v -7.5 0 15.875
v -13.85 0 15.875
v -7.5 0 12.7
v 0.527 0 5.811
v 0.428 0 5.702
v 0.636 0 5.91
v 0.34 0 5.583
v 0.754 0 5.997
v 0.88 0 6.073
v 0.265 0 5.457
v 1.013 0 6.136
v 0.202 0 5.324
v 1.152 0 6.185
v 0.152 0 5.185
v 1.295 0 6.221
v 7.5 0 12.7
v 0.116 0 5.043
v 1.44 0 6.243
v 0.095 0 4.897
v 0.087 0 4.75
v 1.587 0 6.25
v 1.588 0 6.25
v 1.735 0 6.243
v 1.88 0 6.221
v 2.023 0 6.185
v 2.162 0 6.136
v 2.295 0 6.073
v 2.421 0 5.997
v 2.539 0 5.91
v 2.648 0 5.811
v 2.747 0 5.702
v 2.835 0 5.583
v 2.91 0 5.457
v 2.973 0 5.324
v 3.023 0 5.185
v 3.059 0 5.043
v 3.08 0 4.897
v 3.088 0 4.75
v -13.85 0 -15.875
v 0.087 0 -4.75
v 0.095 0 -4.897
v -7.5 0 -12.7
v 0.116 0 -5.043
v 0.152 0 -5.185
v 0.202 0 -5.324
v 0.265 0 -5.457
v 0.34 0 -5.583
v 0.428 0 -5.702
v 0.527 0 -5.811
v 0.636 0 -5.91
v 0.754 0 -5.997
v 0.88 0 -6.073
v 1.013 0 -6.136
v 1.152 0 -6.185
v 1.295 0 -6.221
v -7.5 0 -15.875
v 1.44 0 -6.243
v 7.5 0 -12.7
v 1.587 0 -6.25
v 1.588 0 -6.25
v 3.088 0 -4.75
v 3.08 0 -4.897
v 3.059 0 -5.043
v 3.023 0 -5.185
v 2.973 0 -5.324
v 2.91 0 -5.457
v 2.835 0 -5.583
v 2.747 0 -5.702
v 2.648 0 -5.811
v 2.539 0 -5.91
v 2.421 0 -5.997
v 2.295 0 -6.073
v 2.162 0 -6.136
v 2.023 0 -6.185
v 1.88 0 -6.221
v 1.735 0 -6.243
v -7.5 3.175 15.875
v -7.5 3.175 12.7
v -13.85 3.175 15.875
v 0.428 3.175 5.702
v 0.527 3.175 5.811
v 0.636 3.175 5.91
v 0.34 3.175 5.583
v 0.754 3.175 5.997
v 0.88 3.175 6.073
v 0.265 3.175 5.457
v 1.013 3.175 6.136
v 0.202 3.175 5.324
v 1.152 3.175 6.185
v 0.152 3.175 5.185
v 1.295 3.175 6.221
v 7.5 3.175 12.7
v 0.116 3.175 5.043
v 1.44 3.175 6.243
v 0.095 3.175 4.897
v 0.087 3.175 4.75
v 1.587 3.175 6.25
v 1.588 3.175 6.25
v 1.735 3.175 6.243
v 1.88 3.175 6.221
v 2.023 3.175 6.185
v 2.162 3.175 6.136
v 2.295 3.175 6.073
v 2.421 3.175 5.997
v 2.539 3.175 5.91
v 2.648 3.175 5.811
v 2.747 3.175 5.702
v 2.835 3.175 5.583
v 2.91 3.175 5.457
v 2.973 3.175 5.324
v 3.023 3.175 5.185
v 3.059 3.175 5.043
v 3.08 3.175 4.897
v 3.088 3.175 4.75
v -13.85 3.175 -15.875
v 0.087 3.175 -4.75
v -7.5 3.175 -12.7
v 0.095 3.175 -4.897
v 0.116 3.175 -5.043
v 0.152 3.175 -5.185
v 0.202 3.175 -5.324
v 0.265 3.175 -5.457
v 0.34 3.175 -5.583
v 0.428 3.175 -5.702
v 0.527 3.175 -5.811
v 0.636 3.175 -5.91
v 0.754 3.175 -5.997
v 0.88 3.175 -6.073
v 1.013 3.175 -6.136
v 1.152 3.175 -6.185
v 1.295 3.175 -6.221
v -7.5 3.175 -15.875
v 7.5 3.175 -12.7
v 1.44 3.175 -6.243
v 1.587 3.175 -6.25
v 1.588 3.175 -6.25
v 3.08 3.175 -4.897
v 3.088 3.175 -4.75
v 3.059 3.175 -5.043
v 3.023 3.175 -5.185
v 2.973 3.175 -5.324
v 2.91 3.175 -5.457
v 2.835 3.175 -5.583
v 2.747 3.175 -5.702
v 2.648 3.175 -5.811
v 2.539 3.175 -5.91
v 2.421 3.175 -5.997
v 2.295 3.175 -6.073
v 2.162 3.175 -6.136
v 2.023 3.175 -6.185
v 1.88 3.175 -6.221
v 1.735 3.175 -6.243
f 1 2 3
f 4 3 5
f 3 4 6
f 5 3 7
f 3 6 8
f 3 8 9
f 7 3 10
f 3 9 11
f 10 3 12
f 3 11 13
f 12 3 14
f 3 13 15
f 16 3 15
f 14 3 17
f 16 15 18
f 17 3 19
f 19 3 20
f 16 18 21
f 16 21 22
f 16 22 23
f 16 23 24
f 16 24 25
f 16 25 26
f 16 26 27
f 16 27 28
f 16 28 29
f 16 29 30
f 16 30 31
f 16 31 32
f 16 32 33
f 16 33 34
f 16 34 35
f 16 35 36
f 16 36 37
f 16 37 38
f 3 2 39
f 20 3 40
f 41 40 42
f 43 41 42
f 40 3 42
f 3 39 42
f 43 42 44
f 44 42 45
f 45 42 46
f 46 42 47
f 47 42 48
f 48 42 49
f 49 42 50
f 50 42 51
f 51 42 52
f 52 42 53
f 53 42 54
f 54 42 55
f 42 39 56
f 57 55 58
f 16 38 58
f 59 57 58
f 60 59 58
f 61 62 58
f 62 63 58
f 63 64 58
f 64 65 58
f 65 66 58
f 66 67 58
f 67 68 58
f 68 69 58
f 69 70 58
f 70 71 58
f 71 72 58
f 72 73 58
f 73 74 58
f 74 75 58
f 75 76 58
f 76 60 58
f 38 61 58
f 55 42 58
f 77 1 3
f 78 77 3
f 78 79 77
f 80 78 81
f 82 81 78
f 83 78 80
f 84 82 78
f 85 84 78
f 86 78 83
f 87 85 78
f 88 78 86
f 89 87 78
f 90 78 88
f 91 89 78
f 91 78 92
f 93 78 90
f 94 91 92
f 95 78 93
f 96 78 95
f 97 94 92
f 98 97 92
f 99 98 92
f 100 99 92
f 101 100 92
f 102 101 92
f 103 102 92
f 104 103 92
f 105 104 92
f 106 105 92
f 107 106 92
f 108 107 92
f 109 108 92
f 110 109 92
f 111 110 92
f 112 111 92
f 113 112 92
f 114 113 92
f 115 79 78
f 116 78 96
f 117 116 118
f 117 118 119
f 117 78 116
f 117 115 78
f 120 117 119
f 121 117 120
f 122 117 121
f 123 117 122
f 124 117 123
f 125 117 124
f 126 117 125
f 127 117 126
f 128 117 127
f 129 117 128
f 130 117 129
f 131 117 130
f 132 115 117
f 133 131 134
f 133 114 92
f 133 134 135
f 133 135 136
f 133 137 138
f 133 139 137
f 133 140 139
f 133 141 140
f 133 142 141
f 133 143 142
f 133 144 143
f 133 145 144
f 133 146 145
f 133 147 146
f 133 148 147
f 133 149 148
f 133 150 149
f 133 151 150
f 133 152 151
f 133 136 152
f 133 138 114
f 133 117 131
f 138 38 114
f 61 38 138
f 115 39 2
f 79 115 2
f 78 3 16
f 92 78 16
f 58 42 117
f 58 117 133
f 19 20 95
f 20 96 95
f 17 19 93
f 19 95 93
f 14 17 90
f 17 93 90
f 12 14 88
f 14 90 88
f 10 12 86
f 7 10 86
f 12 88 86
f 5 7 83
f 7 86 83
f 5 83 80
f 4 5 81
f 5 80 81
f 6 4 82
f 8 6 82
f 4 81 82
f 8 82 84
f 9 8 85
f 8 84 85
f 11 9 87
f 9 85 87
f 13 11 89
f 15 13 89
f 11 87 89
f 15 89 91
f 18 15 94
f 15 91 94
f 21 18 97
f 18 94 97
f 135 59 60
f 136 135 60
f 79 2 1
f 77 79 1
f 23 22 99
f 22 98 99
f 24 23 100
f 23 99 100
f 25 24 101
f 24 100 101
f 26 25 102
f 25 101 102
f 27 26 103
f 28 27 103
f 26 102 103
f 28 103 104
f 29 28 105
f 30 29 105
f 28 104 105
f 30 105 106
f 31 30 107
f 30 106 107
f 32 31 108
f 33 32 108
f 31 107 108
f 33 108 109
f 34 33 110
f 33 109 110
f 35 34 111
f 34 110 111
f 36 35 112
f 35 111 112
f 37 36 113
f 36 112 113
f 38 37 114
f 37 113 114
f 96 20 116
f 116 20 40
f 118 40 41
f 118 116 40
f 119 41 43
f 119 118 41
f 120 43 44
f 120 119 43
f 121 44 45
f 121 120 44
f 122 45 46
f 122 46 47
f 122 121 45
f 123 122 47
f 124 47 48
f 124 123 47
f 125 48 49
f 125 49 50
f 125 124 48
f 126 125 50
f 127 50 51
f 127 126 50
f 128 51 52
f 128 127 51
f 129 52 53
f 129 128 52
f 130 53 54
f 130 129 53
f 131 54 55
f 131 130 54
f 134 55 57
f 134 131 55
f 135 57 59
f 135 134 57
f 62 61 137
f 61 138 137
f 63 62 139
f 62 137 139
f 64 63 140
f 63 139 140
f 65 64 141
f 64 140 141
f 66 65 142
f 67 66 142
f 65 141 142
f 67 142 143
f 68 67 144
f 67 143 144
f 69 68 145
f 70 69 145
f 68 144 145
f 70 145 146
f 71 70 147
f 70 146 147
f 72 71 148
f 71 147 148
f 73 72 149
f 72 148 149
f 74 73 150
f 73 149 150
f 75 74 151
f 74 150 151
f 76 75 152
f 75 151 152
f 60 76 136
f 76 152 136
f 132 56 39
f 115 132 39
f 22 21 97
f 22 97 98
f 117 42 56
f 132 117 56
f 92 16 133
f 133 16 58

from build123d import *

# Parameters (mm, degrees)
SKETCH1_W               = 15
SKETCH1_H               = 25.4
BOSS_EXTRUDE1_DEPTH     = 3.175
CUT_EXTRUDE1_DEPTH      = 22.305369042
CUT_EXTRUDE1_DEPTH_BACK = 22.305369042
SKETCH2_W               = 3
SKETCH2_H               = 12.5
FILLET1_R               = 1.5


with BuildPart() as part:
    # Sketch1 → Boss-Extrude1 (new body)
    with BuildSketch(Plane(origin=(0, 0, 0), x_dir=(1, 0, 0), z_dir=(0, 1, 0))):
        Polygon((-7.5, -12.7), (-7.5, 12.7), (-7.5, 15.875), (-13.85, 15.875), (-13.85, -15.875), (-7.5, -15.875), align=None)
        Rectangle(SKETCH1_W, SKETCH1_H)
    extrude(amount=BOSS_EXTRUDE1_DEPTH)

    # Sketch2 → Cut-Extrude1 (cut, two sides: drawn at the far end of the back side and taken through both)
    with BuildSketch(Plane(origin=(0, 3.175, 0), x_dir=(1, 0, 0), z_dir=(0, 1, 0)).offset(-CUT_EXTRUDE1_DEPTH_BACK)):
        with Locations((1.5875, 0)):
            Rectangle(SKETCH2_W, SKETCH2_H)
    extrude(amount=CUT_EXTRUDE1_DEPTH + CUT_EXTRUDE1_DEPTH_BACK, mode=Mode.SUBTRACT)

    # Fillet1
    fillet1_edges = [part.edges().sort_by_distance(p)[0] for p in [
        (3.0875, 1.5875, -6.25),
        (3.0875, 1.5875, 6.25),
        (0.0875, 1.5875, 6.25),
        (0.0875, 1.5875, -6.25),
    ]]
    fillet(fillet1_edges, radius=FILLET1_R - 0.0001)  # a hair under: the kernel refuses the full size


solid = part.part
